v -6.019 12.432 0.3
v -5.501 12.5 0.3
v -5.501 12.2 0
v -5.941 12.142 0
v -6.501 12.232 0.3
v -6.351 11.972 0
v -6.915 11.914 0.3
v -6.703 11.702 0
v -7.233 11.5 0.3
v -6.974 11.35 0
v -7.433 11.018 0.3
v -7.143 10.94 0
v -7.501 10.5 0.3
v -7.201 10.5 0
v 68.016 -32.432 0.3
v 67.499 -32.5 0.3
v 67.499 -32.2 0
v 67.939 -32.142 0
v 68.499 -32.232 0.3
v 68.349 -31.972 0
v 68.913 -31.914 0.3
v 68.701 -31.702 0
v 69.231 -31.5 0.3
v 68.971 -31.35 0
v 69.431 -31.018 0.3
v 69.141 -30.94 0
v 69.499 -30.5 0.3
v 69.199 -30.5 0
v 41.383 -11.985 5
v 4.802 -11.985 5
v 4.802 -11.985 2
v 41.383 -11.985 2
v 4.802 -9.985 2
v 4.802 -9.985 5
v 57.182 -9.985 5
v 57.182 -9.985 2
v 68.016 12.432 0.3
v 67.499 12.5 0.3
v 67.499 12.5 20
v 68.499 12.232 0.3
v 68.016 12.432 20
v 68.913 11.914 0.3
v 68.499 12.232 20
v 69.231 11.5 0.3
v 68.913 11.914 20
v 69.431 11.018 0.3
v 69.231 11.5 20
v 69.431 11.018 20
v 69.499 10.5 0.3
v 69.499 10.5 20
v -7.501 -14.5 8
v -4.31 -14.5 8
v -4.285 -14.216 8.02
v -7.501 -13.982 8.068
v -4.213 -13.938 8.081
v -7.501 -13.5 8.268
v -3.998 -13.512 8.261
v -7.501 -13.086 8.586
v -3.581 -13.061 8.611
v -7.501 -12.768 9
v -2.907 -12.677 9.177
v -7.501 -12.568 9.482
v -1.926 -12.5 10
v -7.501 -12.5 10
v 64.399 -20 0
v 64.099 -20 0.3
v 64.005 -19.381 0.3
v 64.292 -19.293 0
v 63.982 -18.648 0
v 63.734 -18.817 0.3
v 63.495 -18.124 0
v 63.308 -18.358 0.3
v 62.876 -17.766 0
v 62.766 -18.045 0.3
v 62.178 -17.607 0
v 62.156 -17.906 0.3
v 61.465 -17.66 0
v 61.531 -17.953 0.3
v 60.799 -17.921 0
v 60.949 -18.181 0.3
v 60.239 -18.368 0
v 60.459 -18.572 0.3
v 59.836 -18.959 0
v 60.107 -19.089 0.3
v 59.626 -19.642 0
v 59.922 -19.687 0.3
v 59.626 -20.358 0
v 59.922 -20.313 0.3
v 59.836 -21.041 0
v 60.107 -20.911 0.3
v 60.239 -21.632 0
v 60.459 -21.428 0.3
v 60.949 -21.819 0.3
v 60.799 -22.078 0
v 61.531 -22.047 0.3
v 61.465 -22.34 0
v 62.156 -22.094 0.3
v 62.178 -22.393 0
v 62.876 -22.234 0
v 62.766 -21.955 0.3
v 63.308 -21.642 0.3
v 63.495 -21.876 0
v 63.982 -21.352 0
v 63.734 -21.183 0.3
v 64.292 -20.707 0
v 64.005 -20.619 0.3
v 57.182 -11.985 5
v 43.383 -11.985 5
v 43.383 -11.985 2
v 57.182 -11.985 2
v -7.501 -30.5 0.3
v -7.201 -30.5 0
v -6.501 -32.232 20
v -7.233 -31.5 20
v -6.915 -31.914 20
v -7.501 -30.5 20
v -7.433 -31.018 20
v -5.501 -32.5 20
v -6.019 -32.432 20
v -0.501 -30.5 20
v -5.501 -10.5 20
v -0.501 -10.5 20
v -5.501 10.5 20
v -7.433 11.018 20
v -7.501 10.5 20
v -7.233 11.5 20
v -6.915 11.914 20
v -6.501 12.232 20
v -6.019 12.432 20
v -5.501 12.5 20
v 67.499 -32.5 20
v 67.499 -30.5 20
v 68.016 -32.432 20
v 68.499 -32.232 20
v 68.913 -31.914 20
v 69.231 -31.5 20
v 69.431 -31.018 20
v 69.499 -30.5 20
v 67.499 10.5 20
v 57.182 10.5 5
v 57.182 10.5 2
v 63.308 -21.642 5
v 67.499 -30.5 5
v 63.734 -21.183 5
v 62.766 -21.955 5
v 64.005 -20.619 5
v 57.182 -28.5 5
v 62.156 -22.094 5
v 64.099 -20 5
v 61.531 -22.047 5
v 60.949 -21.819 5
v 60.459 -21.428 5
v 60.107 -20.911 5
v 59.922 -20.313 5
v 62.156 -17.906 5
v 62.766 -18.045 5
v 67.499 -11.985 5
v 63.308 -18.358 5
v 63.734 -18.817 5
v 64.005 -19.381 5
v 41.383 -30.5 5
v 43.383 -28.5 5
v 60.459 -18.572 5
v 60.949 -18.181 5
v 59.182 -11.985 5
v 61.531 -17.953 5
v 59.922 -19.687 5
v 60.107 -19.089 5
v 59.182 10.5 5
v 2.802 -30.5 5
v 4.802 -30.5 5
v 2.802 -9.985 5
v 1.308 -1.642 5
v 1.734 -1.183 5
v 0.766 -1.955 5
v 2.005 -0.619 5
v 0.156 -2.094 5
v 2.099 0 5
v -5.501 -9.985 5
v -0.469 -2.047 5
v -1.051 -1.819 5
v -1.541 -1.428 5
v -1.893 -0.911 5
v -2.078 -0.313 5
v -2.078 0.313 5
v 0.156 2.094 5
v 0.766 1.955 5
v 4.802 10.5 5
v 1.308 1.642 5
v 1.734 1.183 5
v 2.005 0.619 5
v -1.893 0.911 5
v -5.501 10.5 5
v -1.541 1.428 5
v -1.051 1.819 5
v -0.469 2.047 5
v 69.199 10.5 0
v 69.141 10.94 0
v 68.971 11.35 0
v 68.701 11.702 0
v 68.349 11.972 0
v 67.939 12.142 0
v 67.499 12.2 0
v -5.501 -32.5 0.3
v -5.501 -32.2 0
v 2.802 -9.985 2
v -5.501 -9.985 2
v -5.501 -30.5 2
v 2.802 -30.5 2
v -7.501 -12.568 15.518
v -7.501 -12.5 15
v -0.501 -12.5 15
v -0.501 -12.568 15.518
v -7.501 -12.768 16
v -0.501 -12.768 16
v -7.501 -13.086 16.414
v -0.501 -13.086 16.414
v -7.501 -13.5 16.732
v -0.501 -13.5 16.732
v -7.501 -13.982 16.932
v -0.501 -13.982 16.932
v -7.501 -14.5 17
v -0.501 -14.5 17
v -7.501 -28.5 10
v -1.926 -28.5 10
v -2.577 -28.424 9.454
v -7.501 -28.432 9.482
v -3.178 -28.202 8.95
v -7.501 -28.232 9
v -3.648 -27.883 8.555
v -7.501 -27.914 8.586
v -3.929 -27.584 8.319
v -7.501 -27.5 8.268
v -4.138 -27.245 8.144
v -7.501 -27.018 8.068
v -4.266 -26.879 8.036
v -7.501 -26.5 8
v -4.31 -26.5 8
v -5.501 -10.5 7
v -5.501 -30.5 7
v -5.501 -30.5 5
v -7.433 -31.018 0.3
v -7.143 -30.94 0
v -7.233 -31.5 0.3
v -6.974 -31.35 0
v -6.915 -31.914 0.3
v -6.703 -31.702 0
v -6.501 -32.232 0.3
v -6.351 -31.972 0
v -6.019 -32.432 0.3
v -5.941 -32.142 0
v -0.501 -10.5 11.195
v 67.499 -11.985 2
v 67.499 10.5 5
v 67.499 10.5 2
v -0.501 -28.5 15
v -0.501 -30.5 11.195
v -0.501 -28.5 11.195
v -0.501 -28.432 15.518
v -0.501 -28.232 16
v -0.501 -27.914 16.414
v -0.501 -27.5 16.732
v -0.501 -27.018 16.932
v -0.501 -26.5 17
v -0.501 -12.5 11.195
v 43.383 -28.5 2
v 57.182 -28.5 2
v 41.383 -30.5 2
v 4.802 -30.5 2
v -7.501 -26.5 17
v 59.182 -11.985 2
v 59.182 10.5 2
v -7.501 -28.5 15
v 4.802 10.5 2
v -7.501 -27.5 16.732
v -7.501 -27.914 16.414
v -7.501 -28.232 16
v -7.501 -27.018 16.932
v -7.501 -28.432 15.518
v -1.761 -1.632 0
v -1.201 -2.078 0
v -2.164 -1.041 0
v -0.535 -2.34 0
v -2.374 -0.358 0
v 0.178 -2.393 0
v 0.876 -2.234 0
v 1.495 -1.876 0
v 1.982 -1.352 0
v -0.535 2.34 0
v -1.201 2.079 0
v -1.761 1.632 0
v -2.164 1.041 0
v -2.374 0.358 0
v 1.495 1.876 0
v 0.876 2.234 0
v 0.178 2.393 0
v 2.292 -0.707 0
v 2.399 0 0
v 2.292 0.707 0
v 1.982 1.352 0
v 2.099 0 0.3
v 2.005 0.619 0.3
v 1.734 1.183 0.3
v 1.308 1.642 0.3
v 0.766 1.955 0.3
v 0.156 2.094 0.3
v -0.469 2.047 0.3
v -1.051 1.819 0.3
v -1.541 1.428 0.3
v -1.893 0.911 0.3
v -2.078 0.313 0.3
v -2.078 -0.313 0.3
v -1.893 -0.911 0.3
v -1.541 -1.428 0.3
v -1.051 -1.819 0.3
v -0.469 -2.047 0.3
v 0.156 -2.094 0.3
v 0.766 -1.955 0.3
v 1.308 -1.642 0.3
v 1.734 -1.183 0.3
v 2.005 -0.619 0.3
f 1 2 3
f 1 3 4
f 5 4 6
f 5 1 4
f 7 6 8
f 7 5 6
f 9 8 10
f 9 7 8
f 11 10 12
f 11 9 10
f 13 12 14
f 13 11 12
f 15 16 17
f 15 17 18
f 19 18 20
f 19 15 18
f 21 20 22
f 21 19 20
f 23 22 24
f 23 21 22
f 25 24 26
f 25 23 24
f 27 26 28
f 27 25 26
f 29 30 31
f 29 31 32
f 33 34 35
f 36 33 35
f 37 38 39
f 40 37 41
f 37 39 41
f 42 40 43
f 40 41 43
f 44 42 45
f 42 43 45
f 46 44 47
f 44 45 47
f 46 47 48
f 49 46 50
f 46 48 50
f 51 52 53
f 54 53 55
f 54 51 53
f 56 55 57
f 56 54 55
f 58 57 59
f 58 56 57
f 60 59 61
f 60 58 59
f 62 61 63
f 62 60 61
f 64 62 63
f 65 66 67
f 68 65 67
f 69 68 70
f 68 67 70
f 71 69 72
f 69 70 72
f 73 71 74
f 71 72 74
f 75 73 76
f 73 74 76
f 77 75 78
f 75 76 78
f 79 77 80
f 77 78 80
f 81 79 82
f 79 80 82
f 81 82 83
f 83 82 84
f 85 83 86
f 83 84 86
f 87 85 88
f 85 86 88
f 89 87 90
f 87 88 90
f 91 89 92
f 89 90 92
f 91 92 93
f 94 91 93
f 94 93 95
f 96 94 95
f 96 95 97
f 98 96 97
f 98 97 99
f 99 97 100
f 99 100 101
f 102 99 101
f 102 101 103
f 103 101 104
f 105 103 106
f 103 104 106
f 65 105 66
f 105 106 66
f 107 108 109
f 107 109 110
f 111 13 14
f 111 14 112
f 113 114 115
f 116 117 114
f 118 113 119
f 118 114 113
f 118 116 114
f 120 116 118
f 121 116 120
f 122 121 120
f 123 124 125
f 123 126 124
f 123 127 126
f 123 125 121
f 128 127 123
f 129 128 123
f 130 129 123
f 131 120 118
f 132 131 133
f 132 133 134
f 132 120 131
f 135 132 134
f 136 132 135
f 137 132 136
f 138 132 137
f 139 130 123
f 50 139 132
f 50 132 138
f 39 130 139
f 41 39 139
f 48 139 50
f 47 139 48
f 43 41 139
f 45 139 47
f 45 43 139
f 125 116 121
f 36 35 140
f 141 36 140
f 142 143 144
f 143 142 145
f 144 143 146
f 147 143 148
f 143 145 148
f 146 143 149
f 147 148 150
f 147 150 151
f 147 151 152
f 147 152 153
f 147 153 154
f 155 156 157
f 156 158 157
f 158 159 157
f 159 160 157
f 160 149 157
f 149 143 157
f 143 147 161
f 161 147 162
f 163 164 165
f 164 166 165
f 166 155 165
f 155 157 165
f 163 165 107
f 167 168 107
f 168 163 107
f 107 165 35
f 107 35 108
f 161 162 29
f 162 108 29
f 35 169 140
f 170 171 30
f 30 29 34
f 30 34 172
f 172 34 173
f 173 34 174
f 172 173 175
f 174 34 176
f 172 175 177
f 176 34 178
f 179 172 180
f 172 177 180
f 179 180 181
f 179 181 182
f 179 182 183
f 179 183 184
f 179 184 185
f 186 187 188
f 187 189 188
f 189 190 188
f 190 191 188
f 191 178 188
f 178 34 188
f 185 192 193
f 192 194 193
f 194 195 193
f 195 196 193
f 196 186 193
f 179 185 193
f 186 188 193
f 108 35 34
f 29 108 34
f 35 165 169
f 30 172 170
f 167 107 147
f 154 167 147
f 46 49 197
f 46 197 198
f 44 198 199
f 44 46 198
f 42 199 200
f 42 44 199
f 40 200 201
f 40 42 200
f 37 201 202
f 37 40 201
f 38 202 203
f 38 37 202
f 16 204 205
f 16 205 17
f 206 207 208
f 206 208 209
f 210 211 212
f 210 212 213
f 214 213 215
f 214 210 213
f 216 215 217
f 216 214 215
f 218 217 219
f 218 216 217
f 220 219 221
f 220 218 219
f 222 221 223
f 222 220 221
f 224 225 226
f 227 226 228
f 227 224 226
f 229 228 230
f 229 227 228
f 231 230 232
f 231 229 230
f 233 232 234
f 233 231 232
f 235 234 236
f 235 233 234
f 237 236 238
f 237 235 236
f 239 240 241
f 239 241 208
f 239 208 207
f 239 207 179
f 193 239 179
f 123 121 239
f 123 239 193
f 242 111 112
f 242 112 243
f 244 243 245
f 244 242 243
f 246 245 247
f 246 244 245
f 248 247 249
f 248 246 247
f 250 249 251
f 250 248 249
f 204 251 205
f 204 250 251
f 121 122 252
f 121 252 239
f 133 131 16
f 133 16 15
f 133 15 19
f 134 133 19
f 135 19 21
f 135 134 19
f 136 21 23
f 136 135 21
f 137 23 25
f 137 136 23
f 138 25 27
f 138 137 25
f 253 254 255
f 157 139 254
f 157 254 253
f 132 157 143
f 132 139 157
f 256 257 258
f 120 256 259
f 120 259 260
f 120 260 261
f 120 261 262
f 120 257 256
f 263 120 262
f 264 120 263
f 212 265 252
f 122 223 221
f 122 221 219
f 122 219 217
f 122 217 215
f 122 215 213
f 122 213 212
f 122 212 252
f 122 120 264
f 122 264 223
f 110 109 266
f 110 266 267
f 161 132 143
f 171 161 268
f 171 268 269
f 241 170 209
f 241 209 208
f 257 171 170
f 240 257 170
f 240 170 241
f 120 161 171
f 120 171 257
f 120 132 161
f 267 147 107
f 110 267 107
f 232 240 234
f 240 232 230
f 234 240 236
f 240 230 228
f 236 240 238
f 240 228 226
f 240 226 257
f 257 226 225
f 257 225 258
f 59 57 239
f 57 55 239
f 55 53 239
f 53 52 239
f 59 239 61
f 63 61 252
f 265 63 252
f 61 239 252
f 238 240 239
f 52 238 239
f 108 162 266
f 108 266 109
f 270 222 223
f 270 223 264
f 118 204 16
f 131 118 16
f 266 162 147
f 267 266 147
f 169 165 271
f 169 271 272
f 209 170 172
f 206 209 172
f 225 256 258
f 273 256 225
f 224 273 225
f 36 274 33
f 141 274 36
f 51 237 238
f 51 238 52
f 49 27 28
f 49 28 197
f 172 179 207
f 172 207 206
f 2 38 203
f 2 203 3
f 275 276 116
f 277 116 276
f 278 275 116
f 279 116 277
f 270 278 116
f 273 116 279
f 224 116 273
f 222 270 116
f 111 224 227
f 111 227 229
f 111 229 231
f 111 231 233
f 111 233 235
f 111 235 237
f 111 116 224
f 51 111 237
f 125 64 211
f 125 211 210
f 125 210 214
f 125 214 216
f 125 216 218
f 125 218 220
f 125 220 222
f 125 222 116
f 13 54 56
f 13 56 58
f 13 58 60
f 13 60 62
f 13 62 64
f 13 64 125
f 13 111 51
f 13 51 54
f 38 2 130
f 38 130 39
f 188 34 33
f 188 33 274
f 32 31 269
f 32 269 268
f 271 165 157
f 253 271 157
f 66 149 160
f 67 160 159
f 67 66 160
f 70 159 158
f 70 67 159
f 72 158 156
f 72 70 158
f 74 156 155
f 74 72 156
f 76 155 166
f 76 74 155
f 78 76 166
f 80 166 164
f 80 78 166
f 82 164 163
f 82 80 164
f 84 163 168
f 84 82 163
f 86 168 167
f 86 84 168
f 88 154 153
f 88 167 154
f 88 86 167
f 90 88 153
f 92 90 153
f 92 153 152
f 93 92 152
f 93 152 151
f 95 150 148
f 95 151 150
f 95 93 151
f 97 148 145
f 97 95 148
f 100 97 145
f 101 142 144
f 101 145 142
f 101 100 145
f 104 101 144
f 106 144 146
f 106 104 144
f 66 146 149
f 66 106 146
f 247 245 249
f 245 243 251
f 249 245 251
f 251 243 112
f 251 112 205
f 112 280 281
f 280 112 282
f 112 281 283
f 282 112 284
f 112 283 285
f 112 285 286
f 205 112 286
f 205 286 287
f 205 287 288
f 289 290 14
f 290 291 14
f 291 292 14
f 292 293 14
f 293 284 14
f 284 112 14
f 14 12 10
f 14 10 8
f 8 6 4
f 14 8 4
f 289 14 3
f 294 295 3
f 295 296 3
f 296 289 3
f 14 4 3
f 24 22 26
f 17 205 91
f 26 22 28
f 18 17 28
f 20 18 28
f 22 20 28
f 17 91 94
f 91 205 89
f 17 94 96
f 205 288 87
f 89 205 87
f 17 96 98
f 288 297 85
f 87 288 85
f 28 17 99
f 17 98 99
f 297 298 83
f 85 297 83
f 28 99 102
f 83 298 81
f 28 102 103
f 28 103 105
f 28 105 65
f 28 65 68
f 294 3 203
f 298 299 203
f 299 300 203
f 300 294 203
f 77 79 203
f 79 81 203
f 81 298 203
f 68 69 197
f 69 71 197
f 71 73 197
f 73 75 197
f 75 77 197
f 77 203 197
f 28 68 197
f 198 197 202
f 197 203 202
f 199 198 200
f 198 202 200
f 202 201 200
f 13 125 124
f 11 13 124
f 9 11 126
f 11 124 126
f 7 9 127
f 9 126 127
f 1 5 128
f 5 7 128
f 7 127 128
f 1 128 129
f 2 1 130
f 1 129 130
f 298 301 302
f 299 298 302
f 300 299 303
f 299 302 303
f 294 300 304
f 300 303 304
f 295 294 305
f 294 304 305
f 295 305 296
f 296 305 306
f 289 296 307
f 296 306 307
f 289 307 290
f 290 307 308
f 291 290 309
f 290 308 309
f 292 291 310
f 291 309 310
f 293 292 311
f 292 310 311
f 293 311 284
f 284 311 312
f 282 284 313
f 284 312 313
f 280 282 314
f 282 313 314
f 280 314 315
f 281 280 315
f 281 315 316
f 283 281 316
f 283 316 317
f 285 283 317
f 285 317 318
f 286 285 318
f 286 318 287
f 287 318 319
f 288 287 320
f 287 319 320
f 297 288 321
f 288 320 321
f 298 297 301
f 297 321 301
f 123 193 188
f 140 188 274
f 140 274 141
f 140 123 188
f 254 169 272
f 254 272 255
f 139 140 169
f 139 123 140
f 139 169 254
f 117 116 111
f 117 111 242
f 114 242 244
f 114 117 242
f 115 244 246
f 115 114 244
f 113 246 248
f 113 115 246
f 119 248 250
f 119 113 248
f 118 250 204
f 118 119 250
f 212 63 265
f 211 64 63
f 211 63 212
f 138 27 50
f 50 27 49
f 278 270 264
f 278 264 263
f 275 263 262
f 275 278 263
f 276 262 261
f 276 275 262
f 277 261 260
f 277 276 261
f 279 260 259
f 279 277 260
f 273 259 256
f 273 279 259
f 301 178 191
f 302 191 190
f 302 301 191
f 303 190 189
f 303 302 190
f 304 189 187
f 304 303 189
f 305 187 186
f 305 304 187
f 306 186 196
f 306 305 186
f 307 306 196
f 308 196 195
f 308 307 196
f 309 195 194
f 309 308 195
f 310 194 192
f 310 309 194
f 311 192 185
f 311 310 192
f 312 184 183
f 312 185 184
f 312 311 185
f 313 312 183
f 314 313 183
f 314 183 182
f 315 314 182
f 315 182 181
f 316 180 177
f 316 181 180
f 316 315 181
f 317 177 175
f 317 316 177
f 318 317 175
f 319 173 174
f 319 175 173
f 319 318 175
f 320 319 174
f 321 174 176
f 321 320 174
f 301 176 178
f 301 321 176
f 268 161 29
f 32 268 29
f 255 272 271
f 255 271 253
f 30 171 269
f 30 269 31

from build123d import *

# Parameters (mm, degrees)
SKETCH2_W           = 77
SKETCH2_H           = 45
SKETCH2_R           = 2.1
BOSS_EXTRUDE2_DEPTH = 20
CUT_EXTRUDE1_DEPTH  = 15
SKETCH4_R           = 2.1
SKETCH4_W           = 52.379694286
SKETCH4_H           = 20.484576037
SKETCH4_W_2         = 36.58107182
SKETCH4_H_2         = 18.515423963
SKETCH4_W_3         = 13.798622466
SKETCH4_H_3         = 16.515423963
SKETCH4_W_4         = 8.316970937
SKETCH4_H_4         = 22.484576037
SKETCH4_W_5         = 8.303334777
SKETCH4_H_5         = 20.515423963
CUT_EXTRUDE2_DEPTH  = 3
CUT_EXTRUDE3_REACH  = 79
FILLET1_R           = 2
CUT_EXTRUDE8_DEPTH  = 20
CHAMFER1_SIZE       = 0.3


with BuildPart() as part:
    # Sketch2 → Boss-Extrude2 (new body)
    with BuildSketch(Plane.XY):
        with Locations((30.99874, -9.99994)):
            Rectangle(SKETCH2_W, SKETCH2_H)
        with Locations((-0.00126, 6e-05)):
            Circle(SKETCH2_R, mode=Mode.SUBTRACT)
        with Locations((61.99874, -19.99994)):
            Circle(SKETCH2_R, mode=Mode.SUBTRACT)
    extrude(amount=BOSS_EXTRUDE2_DEPTH)

    # Sketch3 → Cut-Extrude1 (cut)
    with BuildSketch(Plane.XY.offset(20)):
        Polygon((-5.50126, 10.50006), (67.49874, 10.50006), (67.49874, -30.49994), (-0.50126, -30.49994), (-0.50126, -10.49994), (-5.50126, -10.49994), align=None)
    extrude(amount=-CUT_EXTRUDE1_DEPTH, mode=Mode.SUBTRACT)

    # Sketch4 → Cut-Extrude2 (cut)
    with BuildSketch(Plane.XY.offset(5)):
        with Locations((-0.00126, 6e-05)):
            Circle(SKETCH4_R)
        with Locations((61.99874, -19.99994)):
            Circle(SKETCH4_R)
        with Locations((30.99192192, 0.257771982)):
            Rectangle(SKETCH4_W, SKETCH4_H)
        with Locations((23.092610687, -21.242228019)):
            Rectangle(SKETCH4_W_2, SKETCH4_H_2)
        with Locations((50.28245783, -20.242228019)):
            Rectangle(SKETCH4_W_3, SKETCH4_H_3)
        with Locations((63.340254532, -0.742228018)):
            Rectangle(SKETCH4_W_4, SKETCH4_H_4)
        with Locations((-1.349592612, -20.242228019)):
            Rectangle(SKETCH4_W_5, SKETCH4_H_5)
    extrude(amount=-CUT_EXTRUDE2_DEPTH, mode=Mode.SUBTRACT)

    # Sketch5 → Cut-Extrude3 (cut, up to next)
    with BuildSketch(Plane.ZY.offset(7.50126), mode=Mode.PRIVATE) as cut_extrude3_sk1:
        with BuildLine():
            Line((10, -12.49994), (15, -12.49994))
            ThreePointArc((15, -12.49994), (16.414213562, -13.085726438), (17, -14.49994))
            Line((17, -14.49994), (17, -26.49994))
            ThreePointArc((17, -26.49994), (16.414213562, -27.914153562), (15, -28.49994))
            Line((15, -28.49994), (10, -28.49994))
            ThreePointArc((10, -28.49994), (8.585786438, -27.914153562), (8, -26.49994))
            Line((8, -26.49994), (8, -14.49994))
            ThreePointArc((8, -14.49994), (8.585786438, -13.085726438), (10, -12.49994))
        make_face()
    cut_extrude3_tool1 = extrude(cut_extrude3_sk1.sketch, amount=-CUT_EXTRUDE3_REACH, mode=Mode.PRIVATE) & part.part
    add(cut_extrude3_tool1.solids().sort_by_distance((-7.50126, -20.49994, 12.5))[0], mode=Mode.SUBTRACT)

    # Fillet1
    fillet1_edges = [part.edges().sort_by_distance(p)[0] for p in [
        (-7.50126, 12.50006, 10),
        (69.49874, 12.50006, 10),
        (69.49874, -32.49994, 10),
        (-7.50126, -32.49994, 10),
    ]]
    fillet(fillet1_edges, radius=FILLET1_R)

    # Sketch6 → Cut-Extrude8 (cut)
    with BuildSketch(Plane(origin=(0, -10.49994, 0), x_dir=(1, 0, 0), z_dir=(0, 1, 0))):
        Polygon((-5.50126, -7), (-0.50126, -11.195498156), (-0.50126, -5), (-5.50126, -5), align=None)
    extrude(amount=-CUT_EXTRUDE8_DEPTH, mode=Mode.SUBTRACT)

    # Chamfer1
    chamfer1_edges = [part.edges().sort_by_distance(p)[0] for p in [
        (-2.10126, 6e-05, 0),
        (69.49874, -9.99994, 0),
        (-7.50126, -9.99994, 0),
        (30.99874, 12.50006, 0),
        (30.99874, -32.49994, 0),
        (-6.915473562, -31.914153562, 0),
        (-6.915473562, 11.914273562, 0),
        (68.912953562, 11.914273562, 0),
        (68.912953562, -31.914153562, 0),
        (59.89874, -19.99994, 0),
    ]]
    chamfer(chamfer1_edges, length=CHAMFER1_SIZE)


solid = part.part
